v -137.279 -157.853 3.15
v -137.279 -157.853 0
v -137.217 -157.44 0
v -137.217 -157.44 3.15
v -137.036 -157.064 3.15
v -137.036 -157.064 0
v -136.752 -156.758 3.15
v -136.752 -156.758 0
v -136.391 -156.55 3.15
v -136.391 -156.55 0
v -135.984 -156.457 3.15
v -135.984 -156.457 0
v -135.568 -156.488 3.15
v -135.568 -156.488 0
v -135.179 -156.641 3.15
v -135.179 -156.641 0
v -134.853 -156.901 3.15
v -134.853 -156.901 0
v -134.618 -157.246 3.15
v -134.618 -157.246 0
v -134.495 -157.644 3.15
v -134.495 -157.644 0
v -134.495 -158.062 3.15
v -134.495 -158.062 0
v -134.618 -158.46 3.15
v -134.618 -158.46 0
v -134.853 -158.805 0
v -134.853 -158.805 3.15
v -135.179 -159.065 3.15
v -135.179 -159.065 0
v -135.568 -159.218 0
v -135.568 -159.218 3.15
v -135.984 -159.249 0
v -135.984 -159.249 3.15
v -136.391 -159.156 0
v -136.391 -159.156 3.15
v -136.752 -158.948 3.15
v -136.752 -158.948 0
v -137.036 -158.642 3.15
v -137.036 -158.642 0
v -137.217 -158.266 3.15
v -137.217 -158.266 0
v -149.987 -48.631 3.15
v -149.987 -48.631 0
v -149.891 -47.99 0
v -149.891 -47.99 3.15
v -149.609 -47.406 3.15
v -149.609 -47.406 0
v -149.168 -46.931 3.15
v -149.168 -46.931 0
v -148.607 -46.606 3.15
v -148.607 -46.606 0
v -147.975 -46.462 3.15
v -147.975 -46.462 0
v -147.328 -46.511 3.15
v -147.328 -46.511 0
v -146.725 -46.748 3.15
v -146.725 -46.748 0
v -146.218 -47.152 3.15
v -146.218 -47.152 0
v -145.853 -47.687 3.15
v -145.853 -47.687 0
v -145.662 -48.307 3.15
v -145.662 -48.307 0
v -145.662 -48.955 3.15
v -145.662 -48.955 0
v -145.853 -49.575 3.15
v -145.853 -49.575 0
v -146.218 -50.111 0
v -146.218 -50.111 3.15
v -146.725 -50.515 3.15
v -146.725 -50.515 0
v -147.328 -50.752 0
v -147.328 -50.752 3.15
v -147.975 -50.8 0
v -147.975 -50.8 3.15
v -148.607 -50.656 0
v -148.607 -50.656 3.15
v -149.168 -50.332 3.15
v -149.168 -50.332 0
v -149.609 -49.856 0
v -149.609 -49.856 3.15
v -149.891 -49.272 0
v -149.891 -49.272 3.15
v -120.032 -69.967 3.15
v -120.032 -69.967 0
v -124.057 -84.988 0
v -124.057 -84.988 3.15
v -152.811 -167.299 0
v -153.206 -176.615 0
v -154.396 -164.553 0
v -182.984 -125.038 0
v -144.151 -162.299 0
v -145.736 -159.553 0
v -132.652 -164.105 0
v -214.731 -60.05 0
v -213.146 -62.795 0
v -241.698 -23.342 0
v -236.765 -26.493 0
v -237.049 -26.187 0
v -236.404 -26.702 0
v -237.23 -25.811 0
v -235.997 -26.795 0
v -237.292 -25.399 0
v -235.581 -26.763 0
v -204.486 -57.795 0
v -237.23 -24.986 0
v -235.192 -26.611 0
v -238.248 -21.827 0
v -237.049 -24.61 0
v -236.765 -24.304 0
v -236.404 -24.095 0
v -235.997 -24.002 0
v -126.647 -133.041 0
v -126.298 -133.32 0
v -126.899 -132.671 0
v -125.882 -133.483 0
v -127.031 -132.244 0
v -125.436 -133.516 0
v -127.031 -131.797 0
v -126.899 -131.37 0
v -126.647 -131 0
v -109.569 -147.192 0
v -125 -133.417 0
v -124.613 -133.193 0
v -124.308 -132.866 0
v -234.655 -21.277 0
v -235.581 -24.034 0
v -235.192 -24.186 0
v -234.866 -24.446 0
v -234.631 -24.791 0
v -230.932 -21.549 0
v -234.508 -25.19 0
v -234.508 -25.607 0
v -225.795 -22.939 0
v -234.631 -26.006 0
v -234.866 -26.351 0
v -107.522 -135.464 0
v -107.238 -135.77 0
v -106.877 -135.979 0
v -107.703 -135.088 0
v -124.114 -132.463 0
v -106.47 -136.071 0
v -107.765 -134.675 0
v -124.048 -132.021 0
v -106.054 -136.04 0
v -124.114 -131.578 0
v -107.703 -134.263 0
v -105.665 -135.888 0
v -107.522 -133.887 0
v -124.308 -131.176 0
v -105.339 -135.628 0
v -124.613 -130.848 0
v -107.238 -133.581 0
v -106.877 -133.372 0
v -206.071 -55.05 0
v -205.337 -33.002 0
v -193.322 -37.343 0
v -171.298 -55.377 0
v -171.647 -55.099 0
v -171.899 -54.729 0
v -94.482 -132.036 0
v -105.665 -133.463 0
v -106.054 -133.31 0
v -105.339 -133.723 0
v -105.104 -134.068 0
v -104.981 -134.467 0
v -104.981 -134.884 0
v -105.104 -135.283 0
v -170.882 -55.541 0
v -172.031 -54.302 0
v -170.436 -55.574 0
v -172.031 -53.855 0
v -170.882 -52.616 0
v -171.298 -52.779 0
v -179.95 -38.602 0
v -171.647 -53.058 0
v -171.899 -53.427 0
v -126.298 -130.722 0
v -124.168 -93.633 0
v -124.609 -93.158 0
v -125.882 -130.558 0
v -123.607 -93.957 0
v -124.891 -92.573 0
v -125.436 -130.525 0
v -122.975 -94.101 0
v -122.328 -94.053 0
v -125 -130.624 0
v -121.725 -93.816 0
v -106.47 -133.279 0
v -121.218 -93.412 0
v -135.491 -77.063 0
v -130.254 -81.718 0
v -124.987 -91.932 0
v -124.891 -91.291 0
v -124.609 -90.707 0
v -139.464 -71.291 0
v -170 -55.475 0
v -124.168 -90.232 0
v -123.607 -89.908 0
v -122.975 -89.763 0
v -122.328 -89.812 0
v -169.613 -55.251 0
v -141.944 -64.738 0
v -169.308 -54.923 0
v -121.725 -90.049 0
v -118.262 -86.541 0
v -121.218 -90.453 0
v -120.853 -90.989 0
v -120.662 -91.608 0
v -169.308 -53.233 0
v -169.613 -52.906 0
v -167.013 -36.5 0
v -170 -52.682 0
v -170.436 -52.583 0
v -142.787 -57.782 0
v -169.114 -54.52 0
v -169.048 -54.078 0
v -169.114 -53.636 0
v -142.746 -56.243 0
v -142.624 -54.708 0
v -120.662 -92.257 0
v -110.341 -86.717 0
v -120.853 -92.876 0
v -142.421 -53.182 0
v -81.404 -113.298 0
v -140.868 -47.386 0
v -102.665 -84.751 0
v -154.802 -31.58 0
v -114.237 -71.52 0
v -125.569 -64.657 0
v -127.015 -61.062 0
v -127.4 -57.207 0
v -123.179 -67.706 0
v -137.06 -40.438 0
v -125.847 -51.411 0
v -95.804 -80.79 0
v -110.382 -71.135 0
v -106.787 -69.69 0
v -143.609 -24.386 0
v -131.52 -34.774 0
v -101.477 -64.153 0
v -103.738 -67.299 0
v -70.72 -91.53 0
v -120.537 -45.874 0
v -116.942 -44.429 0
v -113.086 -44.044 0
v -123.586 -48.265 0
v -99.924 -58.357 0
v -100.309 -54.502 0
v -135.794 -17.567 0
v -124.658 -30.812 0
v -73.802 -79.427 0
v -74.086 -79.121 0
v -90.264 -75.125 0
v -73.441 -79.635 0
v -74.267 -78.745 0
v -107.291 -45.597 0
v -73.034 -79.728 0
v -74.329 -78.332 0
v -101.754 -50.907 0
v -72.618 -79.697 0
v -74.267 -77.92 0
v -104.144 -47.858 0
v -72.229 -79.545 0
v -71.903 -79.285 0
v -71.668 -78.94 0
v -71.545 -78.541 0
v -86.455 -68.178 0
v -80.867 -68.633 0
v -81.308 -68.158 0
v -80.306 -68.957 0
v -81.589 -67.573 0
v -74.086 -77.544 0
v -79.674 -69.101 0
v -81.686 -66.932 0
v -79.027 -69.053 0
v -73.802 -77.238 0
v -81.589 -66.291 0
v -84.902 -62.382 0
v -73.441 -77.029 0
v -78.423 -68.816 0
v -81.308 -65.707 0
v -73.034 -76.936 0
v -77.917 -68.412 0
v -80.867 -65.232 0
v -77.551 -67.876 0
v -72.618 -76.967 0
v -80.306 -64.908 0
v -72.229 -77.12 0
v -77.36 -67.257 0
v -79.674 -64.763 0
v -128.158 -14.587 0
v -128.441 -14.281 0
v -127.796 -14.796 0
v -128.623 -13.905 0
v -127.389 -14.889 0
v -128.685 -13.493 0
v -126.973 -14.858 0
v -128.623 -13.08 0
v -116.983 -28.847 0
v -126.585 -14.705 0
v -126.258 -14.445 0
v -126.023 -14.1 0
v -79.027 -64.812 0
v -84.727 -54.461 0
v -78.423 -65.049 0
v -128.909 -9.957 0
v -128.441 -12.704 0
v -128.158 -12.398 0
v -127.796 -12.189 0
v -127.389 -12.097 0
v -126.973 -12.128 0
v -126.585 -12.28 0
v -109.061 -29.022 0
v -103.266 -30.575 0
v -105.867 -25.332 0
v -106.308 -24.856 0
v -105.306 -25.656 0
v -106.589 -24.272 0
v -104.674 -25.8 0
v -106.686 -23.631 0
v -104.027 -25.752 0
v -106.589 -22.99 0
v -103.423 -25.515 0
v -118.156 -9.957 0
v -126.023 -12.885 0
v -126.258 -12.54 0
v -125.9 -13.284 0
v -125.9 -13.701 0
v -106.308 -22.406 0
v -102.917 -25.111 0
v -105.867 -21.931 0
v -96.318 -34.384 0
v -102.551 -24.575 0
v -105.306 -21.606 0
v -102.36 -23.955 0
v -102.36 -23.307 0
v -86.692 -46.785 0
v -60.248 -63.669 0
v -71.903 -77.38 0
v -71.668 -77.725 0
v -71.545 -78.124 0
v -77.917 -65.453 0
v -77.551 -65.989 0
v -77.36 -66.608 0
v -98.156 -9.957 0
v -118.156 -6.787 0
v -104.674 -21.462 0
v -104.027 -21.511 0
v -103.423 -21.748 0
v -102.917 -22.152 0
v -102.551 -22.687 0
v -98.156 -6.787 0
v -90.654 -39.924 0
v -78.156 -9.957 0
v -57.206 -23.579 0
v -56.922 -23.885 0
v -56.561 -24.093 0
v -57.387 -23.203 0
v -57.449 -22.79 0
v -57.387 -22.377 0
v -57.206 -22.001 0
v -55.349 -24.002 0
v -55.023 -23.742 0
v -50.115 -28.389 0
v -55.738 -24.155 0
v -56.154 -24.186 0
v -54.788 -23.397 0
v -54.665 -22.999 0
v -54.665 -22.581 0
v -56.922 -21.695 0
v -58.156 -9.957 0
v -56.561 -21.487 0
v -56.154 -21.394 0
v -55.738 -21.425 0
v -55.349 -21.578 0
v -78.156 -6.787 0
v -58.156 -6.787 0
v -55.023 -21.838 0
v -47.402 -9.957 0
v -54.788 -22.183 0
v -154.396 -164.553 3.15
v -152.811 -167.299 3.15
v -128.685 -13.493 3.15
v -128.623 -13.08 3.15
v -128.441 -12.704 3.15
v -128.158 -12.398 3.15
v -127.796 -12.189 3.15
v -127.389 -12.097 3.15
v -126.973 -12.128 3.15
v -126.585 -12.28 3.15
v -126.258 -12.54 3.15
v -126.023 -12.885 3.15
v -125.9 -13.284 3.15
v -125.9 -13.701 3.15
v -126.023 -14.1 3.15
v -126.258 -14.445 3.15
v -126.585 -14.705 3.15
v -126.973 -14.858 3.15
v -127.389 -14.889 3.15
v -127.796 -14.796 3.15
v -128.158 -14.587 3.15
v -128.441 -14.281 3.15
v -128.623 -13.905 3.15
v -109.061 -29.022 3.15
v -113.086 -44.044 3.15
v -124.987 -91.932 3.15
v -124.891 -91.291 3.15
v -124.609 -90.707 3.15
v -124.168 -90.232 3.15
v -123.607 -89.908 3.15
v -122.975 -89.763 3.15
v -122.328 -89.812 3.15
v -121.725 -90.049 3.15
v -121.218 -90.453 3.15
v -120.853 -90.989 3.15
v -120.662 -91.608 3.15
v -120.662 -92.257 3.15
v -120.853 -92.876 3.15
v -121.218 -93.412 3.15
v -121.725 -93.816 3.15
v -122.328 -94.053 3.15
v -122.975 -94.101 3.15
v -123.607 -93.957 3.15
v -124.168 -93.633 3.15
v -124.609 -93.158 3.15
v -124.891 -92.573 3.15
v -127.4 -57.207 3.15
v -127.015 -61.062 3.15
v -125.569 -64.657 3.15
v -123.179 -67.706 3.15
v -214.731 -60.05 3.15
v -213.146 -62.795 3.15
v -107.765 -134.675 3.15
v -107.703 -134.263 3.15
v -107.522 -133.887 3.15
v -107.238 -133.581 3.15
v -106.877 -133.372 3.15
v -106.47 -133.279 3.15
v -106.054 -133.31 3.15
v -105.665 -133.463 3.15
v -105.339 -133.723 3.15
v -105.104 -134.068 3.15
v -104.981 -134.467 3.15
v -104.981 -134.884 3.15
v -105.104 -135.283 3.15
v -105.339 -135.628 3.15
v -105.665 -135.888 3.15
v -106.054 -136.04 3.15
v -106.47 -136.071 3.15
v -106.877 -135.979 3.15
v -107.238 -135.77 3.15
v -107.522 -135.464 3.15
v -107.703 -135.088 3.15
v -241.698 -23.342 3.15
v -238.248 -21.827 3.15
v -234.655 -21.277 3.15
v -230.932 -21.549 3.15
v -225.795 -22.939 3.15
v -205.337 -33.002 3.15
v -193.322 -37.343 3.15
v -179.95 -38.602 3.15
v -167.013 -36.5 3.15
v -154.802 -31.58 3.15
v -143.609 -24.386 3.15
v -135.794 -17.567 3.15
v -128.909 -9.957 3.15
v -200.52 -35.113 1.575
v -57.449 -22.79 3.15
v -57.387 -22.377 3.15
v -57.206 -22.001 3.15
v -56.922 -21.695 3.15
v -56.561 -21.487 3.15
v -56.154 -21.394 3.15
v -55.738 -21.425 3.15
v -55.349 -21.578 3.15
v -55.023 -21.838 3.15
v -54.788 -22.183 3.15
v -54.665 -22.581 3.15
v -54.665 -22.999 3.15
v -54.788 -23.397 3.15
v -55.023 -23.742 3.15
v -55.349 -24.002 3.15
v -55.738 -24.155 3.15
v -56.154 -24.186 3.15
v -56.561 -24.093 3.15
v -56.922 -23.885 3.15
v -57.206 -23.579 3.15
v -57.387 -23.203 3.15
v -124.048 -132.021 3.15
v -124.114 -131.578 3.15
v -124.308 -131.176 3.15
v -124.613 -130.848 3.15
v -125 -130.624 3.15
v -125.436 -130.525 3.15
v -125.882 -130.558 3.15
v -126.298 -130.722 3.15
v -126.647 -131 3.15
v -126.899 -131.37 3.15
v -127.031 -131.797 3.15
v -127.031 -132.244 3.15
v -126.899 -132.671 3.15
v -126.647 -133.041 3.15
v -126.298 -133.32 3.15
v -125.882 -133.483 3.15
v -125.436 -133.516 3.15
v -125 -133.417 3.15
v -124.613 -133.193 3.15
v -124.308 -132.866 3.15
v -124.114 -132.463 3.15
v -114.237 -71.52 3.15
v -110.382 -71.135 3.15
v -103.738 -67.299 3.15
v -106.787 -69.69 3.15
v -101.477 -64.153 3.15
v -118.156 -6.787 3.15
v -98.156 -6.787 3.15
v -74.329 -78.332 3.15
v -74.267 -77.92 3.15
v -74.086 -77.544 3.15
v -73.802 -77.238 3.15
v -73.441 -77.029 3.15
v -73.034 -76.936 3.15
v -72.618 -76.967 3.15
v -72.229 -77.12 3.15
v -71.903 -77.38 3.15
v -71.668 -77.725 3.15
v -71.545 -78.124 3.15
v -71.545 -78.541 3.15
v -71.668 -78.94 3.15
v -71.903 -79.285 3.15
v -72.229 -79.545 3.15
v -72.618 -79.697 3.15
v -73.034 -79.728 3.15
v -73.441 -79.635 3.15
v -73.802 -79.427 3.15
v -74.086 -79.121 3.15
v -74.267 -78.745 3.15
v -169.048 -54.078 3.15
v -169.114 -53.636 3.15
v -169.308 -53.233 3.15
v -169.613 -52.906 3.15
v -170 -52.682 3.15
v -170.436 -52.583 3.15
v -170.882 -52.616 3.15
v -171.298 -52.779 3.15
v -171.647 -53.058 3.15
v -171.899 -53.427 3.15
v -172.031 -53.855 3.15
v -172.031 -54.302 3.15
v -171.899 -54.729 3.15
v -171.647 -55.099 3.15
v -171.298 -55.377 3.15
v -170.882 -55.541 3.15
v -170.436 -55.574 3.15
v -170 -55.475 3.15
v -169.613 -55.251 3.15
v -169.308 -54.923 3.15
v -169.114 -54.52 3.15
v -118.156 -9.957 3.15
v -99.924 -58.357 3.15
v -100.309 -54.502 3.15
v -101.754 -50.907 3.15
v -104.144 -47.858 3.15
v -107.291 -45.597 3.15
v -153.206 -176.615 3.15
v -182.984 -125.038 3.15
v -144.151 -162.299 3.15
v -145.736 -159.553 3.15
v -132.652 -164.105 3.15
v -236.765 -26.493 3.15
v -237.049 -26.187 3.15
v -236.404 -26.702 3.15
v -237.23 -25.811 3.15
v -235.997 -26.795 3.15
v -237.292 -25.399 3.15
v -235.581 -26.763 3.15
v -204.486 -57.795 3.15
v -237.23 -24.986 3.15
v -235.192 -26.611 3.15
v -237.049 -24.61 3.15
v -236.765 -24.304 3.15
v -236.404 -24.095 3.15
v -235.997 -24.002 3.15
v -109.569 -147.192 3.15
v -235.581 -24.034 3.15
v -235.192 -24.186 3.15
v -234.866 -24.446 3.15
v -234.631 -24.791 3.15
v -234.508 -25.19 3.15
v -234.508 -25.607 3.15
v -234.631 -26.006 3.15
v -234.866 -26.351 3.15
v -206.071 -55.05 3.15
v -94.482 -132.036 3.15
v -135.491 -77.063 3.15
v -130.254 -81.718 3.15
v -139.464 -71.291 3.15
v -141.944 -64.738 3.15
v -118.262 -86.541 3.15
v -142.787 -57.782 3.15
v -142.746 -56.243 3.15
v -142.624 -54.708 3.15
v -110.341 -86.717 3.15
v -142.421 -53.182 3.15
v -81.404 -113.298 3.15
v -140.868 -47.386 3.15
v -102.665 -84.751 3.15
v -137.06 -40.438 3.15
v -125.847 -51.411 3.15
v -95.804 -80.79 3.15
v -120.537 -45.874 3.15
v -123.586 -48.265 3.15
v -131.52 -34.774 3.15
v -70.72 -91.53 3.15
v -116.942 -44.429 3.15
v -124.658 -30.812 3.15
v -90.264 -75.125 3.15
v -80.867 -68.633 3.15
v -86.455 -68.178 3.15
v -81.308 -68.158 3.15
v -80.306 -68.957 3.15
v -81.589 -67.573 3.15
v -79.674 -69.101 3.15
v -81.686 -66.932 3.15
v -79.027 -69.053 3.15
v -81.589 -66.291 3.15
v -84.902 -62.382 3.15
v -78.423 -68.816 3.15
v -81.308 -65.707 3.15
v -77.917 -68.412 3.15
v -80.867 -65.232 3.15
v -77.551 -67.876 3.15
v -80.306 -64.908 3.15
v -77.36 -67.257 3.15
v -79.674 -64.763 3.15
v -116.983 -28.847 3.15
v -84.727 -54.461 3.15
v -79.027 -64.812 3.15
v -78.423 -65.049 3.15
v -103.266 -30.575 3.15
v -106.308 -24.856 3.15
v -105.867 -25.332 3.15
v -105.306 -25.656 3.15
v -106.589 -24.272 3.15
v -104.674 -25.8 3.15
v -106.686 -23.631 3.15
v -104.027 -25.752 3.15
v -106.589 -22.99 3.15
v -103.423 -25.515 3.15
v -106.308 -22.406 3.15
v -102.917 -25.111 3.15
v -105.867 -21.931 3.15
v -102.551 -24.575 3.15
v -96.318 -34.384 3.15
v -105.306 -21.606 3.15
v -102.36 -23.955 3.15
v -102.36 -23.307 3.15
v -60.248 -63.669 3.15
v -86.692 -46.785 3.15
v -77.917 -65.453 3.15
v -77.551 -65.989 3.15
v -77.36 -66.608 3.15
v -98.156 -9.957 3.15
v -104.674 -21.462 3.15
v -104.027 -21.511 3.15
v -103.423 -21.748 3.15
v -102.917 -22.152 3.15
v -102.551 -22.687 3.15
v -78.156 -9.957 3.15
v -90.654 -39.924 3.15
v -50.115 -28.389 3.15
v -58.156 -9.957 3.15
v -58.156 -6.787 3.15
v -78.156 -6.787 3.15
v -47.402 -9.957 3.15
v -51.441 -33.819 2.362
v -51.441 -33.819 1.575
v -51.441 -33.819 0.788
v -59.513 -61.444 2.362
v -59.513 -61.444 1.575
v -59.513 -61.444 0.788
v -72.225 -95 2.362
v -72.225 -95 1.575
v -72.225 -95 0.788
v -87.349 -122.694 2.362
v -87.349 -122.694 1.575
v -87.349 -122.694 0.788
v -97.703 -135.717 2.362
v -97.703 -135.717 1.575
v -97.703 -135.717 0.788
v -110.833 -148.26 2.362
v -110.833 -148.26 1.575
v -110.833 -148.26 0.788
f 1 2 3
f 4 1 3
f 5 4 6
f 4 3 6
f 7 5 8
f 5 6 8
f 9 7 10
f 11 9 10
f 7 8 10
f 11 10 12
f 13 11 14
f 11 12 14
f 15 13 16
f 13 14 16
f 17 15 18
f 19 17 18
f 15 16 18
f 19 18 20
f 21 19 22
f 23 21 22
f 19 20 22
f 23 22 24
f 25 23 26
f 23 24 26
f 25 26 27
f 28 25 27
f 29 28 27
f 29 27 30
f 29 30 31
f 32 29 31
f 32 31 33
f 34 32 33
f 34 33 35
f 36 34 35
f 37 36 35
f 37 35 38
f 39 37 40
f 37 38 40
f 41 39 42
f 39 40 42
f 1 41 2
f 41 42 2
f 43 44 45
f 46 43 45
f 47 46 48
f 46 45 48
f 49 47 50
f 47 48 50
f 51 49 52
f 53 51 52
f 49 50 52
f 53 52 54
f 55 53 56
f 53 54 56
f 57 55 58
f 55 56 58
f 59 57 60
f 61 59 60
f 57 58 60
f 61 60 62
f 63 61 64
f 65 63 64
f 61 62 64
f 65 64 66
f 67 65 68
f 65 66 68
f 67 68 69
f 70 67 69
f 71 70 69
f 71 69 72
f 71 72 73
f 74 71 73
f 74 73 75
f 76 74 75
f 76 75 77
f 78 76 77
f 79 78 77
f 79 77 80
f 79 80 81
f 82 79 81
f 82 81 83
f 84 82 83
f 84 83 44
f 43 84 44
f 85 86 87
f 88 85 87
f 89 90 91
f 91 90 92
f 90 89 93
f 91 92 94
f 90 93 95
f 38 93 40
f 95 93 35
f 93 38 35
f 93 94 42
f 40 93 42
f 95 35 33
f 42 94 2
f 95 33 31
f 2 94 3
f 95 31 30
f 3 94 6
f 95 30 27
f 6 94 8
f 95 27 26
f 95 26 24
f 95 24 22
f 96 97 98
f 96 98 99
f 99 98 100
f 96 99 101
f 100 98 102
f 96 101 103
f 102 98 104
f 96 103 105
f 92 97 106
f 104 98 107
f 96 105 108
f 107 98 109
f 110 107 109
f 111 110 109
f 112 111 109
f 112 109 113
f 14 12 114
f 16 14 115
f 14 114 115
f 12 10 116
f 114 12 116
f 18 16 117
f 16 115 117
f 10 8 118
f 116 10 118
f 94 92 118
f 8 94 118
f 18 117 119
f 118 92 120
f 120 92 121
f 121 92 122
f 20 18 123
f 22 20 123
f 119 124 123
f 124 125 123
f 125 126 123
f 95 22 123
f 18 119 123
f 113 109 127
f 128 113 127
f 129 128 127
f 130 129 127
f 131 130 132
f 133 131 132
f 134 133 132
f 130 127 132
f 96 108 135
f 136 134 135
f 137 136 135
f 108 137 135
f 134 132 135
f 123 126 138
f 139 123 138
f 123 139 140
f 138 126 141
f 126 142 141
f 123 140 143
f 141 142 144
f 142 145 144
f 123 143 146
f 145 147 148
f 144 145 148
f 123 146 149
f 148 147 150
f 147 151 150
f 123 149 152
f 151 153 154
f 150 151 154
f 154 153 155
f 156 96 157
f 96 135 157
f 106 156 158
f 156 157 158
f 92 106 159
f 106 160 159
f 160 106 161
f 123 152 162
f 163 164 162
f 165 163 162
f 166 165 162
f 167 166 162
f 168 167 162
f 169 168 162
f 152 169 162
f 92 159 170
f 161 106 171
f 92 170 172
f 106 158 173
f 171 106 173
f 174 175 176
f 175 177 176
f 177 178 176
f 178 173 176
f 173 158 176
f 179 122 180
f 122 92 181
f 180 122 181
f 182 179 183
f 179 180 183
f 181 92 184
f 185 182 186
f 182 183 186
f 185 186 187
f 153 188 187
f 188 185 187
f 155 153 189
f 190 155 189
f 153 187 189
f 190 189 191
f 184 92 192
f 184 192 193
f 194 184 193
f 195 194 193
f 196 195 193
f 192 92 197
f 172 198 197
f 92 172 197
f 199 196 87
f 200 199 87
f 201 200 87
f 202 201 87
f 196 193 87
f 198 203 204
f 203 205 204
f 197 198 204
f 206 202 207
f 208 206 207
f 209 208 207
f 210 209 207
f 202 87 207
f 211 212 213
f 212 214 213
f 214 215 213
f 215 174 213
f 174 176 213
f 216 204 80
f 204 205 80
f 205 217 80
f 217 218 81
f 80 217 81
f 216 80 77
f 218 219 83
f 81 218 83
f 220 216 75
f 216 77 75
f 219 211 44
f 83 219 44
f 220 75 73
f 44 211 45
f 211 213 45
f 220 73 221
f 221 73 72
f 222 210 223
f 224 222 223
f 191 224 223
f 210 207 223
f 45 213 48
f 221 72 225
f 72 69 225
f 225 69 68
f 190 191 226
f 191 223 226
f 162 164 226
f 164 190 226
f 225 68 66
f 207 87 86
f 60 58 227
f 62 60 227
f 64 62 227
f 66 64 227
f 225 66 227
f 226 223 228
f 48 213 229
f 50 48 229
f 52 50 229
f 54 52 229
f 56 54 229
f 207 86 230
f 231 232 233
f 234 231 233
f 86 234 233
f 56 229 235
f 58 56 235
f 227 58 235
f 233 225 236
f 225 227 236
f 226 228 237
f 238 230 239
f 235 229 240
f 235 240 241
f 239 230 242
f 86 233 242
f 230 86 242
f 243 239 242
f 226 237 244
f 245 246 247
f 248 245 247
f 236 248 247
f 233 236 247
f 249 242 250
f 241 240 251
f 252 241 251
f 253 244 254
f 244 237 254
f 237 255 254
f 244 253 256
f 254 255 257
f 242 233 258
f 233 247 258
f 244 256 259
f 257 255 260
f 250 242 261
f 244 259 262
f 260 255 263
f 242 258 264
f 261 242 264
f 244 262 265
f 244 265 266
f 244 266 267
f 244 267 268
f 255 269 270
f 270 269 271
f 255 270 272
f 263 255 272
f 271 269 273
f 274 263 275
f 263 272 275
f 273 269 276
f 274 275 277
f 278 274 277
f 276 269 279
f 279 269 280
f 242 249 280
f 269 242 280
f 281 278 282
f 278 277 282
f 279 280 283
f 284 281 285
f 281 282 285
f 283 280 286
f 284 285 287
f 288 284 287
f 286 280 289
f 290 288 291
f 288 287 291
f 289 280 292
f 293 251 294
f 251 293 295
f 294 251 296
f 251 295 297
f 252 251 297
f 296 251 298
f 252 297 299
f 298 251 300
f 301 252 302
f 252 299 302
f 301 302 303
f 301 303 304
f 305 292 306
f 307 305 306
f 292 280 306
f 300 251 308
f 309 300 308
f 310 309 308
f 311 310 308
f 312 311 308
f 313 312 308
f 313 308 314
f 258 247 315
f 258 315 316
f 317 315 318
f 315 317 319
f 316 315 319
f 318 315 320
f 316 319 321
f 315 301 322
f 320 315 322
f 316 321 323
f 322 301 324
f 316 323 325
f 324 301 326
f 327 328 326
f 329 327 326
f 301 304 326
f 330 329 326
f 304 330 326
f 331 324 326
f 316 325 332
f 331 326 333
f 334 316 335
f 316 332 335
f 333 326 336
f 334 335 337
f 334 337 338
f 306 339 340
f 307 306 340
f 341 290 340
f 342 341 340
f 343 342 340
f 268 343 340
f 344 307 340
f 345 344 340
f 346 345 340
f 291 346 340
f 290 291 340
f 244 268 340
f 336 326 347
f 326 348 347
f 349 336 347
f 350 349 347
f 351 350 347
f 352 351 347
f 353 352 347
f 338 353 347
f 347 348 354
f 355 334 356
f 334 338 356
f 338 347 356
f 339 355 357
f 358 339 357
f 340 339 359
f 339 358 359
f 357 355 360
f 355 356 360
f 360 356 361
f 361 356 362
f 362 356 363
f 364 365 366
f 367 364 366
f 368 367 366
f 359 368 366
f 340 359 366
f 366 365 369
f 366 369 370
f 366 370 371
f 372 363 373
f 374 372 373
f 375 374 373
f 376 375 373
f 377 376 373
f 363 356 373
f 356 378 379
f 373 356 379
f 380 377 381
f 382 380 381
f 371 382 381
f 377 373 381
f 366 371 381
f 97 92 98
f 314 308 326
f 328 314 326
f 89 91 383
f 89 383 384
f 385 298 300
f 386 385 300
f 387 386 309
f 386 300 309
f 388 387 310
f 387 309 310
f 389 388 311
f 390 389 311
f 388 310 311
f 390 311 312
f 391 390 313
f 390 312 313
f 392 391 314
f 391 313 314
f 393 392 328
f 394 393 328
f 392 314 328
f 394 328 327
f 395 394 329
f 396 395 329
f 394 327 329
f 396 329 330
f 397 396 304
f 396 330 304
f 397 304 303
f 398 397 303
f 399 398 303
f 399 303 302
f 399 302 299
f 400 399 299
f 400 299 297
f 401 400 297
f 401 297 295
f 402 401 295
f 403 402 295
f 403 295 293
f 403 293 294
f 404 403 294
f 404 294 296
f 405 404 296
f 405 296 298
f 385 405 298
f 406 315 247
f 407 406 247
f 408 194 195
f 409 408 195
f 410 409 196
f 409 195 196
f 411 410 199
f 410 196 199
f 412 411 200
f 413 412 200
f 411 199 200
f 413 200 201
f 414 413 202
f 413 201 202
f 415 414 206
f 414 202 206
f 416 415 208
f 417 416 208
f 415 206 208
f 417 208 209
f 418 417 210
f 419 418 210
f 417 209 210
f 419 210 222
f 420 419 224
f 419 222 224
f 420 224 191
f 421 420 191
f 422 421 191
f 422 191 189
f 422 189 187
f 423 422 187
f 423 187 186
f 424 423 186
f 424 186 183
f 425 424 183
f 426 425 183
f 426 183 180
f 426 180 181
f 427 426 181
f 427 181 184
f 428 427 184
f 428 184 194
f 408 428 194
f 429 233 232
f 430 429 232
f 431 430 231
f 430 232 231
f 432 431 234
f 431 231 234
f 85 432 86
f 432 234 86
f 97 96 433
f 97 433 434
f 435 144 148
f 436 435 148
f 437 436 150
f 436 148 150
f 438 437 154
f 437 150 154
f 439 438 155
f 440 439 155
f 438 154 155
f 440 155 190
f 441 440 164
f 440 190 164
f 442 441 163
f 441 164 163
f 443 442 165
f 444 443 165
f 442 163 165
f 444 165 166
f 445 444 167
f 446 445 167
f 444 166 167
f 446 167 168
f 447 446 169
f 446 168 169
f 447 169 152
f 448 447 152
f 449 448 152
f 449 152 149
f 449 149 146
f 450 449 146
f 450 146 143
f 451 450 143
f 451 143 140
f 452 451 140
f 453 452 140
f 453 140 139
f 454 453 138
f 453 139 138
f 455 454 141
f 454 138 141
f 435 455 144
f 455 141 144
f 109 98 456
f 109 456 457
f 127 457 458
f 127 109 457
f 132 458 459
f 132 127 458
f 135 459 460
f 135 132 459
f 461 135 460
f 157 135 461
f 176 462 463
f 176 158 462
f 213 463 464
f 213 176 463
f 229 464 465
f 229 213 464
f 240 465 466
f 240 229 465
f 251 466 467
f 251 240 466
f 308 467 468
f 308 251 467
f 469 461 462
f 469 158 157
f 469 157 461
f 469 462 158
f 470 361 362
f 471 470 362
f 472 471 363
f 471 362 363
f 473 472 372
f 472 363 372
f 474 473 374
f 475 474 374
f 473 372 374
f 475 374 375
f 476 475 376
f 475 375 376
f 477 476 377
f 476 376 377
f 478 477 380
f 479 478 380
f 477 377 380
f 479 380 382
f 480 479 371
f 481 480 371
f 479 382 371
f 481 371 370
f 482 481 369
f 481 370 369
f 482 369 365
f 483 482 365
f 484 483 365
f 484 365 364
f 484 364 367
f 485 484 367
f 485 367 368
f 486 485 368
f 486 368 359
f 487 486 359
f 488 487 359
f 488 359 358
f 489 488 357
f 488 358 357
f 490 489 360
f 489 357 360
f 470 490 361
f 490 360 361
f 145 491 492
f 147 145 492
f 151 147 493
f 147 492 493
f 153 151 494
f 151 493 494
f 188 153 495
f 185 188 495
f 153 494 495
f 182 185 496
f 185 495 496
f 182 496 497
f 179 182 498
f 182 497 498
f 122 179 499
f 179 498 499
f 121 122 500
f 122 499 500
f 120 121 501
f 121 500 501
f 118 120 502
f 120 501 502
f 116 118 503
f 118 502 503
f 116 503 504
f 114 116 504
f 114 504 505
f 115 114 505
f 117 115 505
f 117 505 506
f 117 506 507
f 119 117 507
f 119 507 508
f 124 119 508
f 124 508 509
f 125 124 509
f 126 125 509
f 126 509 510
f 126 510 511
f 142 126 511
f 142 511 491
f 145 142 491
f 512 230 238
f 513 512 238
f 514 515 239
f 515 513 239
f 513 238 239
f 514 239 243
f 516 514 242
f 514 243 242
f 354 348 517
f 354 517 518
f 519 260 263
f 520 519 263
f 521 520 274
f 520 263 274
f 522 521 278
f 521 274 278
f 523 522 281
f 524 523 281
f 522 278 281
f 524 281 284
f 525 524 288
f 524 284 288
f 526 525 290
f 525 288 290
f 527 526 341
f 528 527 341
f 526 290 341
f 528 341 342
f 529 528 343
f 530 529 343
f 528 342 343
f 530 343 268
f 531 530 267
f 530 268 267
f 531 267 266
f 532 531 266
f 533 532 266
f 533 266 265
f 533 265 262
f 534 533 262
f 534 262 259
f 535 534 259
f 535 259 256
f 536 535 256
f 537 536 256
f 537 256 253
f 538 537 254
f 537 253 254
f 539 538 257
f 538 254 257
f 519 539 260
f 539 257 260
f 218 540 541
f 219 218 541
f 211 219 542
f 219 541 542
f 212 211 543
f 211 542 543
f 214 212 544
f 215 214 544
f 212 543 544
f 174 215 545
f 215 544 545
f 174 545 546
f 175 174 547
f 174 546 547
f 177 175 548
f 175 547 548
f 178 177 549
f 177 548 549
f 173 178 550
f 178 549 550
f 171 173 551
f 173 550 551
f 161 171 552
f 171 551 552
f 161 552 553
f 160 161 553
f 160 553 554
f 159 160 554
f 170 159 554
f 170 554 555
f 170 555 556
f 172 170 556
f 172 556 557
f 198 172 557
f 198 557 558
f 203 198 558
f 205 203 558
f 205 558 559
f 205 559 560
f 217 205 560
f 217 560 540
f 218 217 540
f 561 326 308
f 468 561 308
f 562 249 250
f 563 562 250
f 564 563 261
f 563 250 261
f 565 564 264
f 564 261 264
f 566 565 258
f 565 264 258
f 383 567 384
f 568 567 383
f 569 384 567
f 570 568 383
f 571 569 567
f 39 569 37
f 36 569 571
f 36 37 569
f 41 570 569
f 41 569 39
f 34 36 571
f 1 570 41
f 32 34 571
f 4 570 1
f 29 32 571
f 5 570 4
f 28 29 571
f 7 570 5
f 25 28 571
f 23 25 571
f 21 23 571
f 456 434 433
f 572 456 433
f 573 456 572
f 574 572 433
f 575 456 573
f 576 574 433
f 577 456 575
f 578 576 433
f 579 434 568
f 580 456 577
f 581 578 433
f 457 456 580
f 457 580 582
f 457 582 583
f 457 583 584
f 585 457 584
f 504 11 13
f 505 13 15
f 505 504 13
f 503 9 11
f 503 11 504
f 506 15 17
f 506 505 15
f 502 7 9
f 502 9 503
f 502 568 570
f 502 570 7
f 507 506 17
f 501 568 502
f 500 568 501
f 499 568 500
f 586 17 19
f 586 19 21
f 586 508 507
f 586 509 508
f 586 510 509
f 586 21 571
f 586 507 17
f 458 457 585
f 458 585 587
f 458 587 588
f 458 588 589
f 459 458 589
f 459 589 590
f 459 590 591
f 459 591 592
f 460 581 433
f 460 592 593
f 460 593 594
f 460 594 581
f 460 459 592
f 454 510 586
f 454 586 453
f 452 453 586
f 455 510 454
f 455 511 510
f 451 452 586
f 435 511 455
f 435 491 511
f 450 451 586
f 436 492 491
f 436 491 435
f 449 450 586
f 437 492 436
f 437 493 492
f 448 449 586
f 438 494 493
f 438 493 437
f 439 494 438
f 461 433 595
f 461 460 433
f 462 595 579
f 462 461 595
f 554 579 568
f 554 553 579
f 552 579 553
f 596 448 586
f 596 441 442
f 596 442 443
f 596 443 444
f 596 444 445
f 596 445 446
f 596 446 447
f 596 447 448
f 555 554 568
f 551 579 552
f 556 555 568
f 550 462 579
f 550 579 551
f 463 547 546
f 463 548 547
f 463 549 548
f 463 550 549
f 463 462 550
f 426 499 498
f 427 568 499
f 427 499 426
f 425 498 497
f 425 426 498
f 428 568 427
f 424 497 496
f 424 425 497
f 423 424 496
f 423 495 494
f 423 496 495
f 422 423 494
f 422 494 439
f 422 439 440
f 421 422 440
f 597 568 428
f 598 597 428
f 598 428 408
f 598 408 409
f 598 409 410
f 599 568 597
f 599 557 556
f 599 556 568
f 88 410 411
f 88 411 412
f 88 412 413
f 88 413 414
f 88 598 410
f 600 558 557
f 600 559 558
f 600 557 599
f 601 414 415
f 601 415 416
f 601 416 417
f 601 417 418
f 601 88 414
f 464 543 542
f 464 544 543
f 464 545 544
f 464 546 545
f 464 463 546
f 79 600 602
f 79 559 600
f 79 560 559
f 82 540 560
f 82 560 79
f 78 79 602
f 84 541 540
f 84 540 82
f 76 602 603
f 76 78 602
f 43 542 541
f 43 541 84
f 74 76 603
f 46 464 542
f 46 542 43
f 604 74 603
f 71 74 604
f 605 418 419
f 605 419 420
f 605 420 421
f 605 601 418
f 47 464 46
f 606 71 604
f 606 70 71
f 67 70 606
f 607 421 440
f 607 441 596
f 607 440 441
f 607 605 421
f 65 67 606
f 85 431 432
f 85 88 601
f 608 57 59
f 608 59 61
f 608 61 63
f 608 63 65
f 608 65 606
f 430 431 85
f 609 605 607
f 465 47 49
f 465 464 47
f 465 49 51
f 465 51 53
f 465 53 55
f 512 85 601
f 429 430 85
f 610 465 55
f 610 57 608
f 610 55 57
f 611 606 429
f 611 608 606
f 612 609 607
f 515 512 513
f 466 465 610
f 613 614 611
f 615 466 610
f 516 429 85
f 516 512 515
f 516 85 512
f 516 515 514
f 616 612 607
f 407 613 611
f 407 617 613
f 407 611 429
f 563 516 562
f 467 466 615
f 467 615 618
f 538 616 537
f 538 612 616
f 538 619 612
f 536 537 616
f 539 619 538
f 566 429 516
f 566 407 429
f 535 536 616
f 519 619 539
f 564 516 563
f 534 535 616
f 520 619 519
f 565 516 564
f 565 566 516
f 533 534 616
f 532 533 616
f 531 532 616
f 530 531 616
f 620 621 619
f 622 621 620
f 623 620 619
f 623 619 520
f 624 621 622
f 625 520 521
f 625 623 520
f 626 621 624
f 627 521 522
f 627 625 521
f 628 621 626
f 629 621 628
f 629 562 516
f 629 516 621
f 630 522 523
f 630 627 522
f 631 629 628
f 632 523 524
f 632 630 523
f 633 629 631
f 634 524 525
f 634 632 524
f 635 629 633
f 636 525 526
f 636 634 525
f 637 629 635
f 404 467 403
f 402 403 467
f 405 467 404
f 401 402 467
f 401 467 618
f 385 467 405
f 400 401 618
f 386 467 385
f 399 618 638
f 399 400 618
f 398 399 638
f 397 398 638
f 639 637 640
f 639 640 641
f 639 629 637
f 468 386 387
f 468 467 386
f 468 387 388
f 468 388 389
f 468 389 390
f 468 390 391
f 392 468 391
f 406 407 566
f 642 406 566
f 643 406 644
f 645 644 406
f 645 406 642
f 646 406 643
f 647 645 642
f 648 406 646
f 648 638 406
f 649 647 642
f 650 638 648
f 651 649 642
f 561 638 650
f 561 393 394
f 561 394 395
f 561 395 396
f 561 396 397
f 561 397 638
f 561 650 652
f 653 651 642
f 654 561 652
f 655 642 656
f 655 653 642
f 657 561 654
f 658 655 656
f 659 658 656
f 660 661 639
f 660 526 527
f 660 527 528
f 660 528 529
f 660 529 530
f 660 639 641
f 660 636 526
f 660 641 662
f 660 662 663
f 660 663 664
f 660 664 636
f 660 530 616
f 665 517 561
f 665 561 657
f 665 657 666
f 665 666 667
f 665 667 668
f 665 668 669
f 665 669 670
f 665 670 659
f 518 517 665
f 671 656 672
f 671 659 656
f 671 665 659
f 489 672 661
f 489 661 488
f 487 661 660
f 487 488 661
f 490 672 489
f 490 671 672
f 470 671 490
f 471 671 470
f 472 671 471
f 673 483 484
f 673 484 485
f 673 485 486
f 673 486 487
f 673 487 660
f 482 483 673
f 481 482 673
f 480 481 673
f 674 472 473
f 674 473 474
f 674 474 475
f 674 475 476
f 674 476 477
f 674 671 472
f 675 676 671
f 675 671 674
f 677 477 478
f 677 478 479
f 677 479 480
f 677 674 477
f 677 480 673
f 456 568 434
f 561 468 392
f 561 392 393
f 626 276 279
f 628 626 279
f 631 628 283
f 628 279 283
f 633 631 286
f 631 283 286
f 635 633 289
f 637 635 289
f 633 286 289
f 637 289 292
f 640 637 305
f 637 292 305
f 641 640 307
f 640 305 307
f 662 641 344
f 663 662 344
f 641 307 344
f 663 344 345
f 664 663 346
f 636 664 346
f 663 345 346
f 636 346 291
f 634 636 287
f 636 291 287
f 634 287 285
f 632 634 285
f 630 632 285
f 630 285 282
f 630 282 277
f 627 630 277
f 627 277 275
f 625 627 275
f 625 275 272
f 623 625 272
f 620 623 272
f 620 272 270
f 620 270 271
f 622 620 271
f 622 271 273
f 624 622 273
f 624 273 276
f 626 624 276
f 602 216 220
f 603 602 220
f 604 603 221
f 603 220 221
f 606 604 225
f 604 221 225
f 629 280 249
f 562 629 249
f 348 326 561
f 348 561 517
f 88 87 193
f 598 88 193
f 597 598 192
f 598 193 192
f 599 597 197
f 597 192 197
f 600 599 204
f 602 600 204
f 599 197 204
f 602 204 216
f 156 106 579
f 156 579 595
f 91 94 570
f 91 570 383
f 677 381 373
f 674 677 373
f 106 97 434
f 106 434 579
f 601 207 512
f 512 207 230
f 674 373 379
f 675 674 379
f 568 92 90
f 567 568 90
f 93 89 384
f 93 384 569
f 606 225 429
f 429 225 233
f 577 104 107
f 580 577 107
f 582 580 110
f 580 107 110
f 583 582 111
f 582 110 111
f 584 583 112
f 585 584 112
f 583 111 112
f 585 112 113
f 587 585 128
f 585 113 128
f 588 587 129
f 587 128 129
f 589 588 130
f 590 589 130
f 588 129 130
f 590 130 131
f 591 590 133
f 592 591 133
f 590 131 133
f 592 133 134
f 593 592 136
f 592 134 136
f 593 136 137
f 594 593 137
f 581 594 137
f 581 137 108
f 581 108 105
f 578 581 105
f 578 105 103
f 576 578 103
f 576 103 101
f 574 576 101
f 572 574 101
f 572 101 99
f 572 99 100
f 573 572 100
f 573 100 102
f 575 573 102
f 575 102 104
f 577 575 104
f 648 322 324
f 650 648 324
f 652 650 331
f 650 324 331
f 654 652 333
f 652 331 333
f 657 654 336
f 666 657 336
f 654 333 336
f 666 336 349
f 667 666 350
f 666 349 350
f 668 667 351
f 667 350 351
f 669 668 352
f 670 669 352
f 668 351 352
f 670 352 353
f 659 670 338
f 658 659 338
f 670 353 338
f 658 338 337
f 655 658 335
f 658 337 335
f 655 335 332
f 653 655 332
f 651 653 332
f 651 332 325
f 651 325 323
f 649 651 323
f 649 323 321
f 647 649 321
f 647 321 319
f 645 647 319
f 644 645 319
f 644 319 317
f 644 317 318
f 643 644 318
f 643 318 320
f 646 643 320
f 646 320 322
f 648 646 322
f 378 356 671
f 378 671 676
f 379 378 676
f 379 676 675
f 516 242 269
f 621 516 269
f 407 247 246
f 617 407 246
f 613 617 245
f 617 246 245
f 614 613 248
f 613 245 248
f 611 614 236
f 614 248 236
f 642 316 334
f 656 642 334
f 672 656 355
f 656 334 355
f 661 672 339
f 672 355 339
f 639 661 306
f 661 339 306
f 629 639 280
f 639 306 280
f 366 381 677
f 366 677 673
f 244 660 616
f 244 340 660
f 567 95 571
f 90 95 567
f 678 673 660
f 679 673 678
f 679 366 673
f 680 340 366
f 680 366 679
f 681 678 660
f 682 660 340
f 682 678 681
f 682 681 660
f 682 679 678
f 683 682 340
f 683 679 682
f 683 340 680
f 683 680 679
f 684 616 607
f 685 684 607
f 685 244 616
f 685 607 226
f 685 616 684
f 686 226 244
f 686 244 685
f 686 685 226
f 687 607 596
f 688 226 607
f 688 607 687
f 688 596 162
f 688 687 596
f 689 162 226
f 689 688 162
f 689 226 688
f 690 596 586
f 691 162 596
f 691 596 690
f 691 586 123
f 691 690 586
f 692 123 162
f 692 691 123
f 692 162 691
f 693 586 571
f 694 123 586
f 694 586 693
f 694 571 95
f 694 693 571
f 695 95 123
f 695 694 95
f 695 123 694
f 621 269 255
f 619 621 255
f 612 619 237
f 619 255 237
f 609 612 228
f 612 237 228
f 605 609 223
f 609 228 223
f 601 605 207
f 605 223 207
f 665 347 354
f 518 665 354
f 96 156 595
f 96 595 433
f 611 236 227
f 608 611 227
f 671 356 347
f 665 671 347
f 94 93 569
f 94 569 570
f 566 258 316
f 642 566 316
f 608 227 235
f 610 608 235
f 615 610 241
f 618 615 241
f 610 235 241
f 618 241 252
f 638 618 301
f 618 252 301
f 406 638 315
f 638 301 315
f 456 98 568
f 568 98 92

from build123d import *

# Parameters (mm, degrees)
SKETCH1_W           = 20
SKETCH1_H           = 3.17
BOSS_EXTRUDE1_DEPTH = 3.15
SKETCH3_R           = 1.5
CUT_EXTRUDE3_DEPTH  = 4
SKETCH4_R           = 1.4
CUT_EXTRUDE4_DEPTH  = 300.367282694
SKETCH5_R           = 1.4
CUT_EXTRUDE5_DEPTH  = 10
SKETCH8_R           = 1.4
CUT_EXTRUDE6_DEPTH  = 3.15
SKETCH10_R          = 2.175
CUT_EXTRUDE9_DEPTH  = 10


with BuildPart() as part:
    # Sketch1 → Boss-Extrude1 (new body)
    # profile 1 of 3: a face of its own
    with BuildSketch(Plane.XY):
        with BuildLine():
            Line((-241.698190941, -23.342278563), (-182.984296622, -125.037726634))
            Line((-182.984296622, -125.037726634), (-153.206187055, -176.614925358))
            add(Edge.make_bspline(
                [(-47.401899165, -9.957262145), (-47.829142386, -14.25185708), (-46.723988324, -19.969891501), (-68.682398123, -93.959649611), (-98.488851457, -144.156557444), (-142.971221813, -170.754120269), (-153.206187055, -176.614925358)],
                knots=[0.137311336, 0.137311336, 0.137311336, 0.137311336, 0.404180931, 0.63636099, 0.837197323, 0.978117302, 0.978117302, 0.978117302, 0.978117302], degree=3))
            Line((-47.401899165, -9.957262145), (-128.909491715, -9.957262145))
            add(Edge.make_bspline(
                [(-241.698190941, -23.342278563), (-229.917917727, -16.192032852), (-187.817846519, -53.973476211), (-145.539794723, -30.618927667), (-128.909491715, -9.957262145)],
                knots=[0, 0, 0, 0, 0.348890398, 1, 1, 1, 1], degree=3))
        make_face()
        Polygon((-206.071121951, -55.050172178), (-214.731375989, -60.050172178), (-213.146375989, -62.795472708), (-204.486121951, -57.795472708), align=None, mode=Mode.SUBTRACT)
        Polygon((-145.736121951, -159.553457653), (-154.396375989, -164.553457653), (-152.811375989, -167.298758183), (-144.151121951, -162.298758183), align=None, mode=Mode.SUBTRACT)
    # profile 2 of 3: a face of its own
    with BuildSketch(Plane.XY):
        with Locations((-108.15569544, -8.372262145)):
            Rectangle(SKETCH1_W, SKETCH1_H)
    # profile 3 of 3: a face of its own
    with BuildSketch(Plane.XY):
        with Locations((-68.15569544, -8.372262145)):
            Rectangle(SKETCH1_W, SKETCH1_H)
    extrude(amount=BOSS_EXTRUDE1_DEPTH)

    # Sketch3 → Cut-Extrude3 (cut)
    with BuildSketch(Plane.XY.offset(3.15)):
        with Locations((-170.547828083, -54.078322011)):
            Circle(SKETCH3_R)
        with Locations((-125.547828083, -132.020608351)):
            Circle(SKETCH3_R)
    extrude(amount=-CUT_EXTRUDE3_DEPTH, mode=Mode.SUBTRACT)

    # Sketch4 → Cut-Extrude4 (cut, through all)
    with BuildSketch(Plane(origin=(0, 0, 0), x_dir=(-1, 0, 0), z_dir=(0, 0, -1))):
        with Locations((235.892202029, -25.398546347)):
            Circle(SKETCH4_R)
    extrude(amount=-CUT_EXTRUDE4_DEPTH, mode=Mode.SUBTRACT)

    # Sketch5 → Cut-Extrude5 (cut)
    with BuildSketch(Plane(origin=(0, 0, 0), x_dir=(-1, 0, 0), z_dir=(0, 0, -1))):
        with Locations((127.284730109, -13.492653155)):
            Circle(SKETCH5_R)
    extrude(amount=-CUT_EXTRUDE5_DEPTH, mode=Mode.SUBTRACT)

    # Sketch8 → Cut-Extrude6 (cut)
    with BuildSketch(Plane(origin=(0, 0, 0), x_dir=(-1, 0, 0), z_dir=(0, 0, -1))):
        with Locations((56.049452266, -22.790015721)):
            Circle(SKETCH8_R)
        with Locations((72.929258412, -78.332275214)):
            Circle(SKETCH8_R)
        with Locations((106.365497467, -134.675290405)):
            Circle(SKETCH8_R)
        with Locations((135.879277113, -157.853014262)):
            Circle(SKETCH8_R)
    extrude(amount=-CUT_EXTRUDE6_DEPTH, mode=Mode.SUBTRACT)

    # Sketch10 → Cut-Extrude9 (cut)
    with BuildSketch(Plane(origin=(0, 0, 0), x_dir=(-1, 0, 0), z_dir=(0, 0, -1))):
        with BuildLine():
            ThreePointArc((86.455124846, -68.17754579), (99.09911767, -83.004749353), (118.261849034, -86.541166561))
            Line((118.261849034, -86.541166561), (114.236864862, -71.519721131))
            ThreePointArc((114.236864862, -71.519721131), (106.78661767, -69.68960877), (101.476570277, -64.152561617))
            Line((101.476570277, -64.152561617), (86.455124846, -68.17754579))
        make_face()
        with BuildLine():
            ThreePointArc((103.265831348, -30.575266644), (88.438627785, -43.219259467), (84.902210576, -62.381990832))
            Line((84.902210576, -62.381990832), (99.923656006, -58.35700666))
            ThreePointArc((99.923656006, -58.35700666), (101.753768368, -50.906759467), (107.29081552, -45.596712075))
            Line((107.29081552, -45.596712075), (103.265831348, -30.575266644))
        make_face()
        with BuildLine():
            Line((125.846665063, -51.410957318), (140.868110493, -47.385973145))
            ThreePointArc((140.868110493, -47.385973145), (128.22411767, -32.558769582), (109.061386305, -29.022352374))
            Line((109.061386305, -29.022352374), (113.086370478, -44.043797804))
            ThreePointArc((113.086370478, -44.043797804), (120.53661767, -45.873910165), (125.846665063, -51.410957318))
        make_face()
        with BuildLine():
            Line((120.03241982, -69.96680686), (124.057403992, -84.988252291))
            ThreePointArc((124.057403992, -84.988252291), (137.651645824, -74.296727653), (142.78661767, -57.781759467))
            ThreePointArc((142.78661767, -57.781759467), (142.695075581, -55.474391553), (142.421024764, -53.181528103))
            Line((142.421024764, -53.181528103), (127.399579333, -57.206512275))
            ThreePointArc((127.399579333, -57.206512275), (125.569466972, -64.656759467), (120.03241982, -69.96680686))
        make_face()
        with Locations((147.812252764, -48.631124373)):
            Circle(SKETCH10_R)
        with Locations((104.510982575, -23.631124373)):
            Circle(SKETCH10_R)
        with Locations((79.510982575, -66.932394562)):
            Circle(SKETCH10_R)
        with Locations((122.812252764, -91.932394562)):
            Circle(SKETCH10_R)
    extrude(amount=-CUT_EXTRUDE9_DEPTH, mode=Mode.SUBTRACT)


solid = part.part
